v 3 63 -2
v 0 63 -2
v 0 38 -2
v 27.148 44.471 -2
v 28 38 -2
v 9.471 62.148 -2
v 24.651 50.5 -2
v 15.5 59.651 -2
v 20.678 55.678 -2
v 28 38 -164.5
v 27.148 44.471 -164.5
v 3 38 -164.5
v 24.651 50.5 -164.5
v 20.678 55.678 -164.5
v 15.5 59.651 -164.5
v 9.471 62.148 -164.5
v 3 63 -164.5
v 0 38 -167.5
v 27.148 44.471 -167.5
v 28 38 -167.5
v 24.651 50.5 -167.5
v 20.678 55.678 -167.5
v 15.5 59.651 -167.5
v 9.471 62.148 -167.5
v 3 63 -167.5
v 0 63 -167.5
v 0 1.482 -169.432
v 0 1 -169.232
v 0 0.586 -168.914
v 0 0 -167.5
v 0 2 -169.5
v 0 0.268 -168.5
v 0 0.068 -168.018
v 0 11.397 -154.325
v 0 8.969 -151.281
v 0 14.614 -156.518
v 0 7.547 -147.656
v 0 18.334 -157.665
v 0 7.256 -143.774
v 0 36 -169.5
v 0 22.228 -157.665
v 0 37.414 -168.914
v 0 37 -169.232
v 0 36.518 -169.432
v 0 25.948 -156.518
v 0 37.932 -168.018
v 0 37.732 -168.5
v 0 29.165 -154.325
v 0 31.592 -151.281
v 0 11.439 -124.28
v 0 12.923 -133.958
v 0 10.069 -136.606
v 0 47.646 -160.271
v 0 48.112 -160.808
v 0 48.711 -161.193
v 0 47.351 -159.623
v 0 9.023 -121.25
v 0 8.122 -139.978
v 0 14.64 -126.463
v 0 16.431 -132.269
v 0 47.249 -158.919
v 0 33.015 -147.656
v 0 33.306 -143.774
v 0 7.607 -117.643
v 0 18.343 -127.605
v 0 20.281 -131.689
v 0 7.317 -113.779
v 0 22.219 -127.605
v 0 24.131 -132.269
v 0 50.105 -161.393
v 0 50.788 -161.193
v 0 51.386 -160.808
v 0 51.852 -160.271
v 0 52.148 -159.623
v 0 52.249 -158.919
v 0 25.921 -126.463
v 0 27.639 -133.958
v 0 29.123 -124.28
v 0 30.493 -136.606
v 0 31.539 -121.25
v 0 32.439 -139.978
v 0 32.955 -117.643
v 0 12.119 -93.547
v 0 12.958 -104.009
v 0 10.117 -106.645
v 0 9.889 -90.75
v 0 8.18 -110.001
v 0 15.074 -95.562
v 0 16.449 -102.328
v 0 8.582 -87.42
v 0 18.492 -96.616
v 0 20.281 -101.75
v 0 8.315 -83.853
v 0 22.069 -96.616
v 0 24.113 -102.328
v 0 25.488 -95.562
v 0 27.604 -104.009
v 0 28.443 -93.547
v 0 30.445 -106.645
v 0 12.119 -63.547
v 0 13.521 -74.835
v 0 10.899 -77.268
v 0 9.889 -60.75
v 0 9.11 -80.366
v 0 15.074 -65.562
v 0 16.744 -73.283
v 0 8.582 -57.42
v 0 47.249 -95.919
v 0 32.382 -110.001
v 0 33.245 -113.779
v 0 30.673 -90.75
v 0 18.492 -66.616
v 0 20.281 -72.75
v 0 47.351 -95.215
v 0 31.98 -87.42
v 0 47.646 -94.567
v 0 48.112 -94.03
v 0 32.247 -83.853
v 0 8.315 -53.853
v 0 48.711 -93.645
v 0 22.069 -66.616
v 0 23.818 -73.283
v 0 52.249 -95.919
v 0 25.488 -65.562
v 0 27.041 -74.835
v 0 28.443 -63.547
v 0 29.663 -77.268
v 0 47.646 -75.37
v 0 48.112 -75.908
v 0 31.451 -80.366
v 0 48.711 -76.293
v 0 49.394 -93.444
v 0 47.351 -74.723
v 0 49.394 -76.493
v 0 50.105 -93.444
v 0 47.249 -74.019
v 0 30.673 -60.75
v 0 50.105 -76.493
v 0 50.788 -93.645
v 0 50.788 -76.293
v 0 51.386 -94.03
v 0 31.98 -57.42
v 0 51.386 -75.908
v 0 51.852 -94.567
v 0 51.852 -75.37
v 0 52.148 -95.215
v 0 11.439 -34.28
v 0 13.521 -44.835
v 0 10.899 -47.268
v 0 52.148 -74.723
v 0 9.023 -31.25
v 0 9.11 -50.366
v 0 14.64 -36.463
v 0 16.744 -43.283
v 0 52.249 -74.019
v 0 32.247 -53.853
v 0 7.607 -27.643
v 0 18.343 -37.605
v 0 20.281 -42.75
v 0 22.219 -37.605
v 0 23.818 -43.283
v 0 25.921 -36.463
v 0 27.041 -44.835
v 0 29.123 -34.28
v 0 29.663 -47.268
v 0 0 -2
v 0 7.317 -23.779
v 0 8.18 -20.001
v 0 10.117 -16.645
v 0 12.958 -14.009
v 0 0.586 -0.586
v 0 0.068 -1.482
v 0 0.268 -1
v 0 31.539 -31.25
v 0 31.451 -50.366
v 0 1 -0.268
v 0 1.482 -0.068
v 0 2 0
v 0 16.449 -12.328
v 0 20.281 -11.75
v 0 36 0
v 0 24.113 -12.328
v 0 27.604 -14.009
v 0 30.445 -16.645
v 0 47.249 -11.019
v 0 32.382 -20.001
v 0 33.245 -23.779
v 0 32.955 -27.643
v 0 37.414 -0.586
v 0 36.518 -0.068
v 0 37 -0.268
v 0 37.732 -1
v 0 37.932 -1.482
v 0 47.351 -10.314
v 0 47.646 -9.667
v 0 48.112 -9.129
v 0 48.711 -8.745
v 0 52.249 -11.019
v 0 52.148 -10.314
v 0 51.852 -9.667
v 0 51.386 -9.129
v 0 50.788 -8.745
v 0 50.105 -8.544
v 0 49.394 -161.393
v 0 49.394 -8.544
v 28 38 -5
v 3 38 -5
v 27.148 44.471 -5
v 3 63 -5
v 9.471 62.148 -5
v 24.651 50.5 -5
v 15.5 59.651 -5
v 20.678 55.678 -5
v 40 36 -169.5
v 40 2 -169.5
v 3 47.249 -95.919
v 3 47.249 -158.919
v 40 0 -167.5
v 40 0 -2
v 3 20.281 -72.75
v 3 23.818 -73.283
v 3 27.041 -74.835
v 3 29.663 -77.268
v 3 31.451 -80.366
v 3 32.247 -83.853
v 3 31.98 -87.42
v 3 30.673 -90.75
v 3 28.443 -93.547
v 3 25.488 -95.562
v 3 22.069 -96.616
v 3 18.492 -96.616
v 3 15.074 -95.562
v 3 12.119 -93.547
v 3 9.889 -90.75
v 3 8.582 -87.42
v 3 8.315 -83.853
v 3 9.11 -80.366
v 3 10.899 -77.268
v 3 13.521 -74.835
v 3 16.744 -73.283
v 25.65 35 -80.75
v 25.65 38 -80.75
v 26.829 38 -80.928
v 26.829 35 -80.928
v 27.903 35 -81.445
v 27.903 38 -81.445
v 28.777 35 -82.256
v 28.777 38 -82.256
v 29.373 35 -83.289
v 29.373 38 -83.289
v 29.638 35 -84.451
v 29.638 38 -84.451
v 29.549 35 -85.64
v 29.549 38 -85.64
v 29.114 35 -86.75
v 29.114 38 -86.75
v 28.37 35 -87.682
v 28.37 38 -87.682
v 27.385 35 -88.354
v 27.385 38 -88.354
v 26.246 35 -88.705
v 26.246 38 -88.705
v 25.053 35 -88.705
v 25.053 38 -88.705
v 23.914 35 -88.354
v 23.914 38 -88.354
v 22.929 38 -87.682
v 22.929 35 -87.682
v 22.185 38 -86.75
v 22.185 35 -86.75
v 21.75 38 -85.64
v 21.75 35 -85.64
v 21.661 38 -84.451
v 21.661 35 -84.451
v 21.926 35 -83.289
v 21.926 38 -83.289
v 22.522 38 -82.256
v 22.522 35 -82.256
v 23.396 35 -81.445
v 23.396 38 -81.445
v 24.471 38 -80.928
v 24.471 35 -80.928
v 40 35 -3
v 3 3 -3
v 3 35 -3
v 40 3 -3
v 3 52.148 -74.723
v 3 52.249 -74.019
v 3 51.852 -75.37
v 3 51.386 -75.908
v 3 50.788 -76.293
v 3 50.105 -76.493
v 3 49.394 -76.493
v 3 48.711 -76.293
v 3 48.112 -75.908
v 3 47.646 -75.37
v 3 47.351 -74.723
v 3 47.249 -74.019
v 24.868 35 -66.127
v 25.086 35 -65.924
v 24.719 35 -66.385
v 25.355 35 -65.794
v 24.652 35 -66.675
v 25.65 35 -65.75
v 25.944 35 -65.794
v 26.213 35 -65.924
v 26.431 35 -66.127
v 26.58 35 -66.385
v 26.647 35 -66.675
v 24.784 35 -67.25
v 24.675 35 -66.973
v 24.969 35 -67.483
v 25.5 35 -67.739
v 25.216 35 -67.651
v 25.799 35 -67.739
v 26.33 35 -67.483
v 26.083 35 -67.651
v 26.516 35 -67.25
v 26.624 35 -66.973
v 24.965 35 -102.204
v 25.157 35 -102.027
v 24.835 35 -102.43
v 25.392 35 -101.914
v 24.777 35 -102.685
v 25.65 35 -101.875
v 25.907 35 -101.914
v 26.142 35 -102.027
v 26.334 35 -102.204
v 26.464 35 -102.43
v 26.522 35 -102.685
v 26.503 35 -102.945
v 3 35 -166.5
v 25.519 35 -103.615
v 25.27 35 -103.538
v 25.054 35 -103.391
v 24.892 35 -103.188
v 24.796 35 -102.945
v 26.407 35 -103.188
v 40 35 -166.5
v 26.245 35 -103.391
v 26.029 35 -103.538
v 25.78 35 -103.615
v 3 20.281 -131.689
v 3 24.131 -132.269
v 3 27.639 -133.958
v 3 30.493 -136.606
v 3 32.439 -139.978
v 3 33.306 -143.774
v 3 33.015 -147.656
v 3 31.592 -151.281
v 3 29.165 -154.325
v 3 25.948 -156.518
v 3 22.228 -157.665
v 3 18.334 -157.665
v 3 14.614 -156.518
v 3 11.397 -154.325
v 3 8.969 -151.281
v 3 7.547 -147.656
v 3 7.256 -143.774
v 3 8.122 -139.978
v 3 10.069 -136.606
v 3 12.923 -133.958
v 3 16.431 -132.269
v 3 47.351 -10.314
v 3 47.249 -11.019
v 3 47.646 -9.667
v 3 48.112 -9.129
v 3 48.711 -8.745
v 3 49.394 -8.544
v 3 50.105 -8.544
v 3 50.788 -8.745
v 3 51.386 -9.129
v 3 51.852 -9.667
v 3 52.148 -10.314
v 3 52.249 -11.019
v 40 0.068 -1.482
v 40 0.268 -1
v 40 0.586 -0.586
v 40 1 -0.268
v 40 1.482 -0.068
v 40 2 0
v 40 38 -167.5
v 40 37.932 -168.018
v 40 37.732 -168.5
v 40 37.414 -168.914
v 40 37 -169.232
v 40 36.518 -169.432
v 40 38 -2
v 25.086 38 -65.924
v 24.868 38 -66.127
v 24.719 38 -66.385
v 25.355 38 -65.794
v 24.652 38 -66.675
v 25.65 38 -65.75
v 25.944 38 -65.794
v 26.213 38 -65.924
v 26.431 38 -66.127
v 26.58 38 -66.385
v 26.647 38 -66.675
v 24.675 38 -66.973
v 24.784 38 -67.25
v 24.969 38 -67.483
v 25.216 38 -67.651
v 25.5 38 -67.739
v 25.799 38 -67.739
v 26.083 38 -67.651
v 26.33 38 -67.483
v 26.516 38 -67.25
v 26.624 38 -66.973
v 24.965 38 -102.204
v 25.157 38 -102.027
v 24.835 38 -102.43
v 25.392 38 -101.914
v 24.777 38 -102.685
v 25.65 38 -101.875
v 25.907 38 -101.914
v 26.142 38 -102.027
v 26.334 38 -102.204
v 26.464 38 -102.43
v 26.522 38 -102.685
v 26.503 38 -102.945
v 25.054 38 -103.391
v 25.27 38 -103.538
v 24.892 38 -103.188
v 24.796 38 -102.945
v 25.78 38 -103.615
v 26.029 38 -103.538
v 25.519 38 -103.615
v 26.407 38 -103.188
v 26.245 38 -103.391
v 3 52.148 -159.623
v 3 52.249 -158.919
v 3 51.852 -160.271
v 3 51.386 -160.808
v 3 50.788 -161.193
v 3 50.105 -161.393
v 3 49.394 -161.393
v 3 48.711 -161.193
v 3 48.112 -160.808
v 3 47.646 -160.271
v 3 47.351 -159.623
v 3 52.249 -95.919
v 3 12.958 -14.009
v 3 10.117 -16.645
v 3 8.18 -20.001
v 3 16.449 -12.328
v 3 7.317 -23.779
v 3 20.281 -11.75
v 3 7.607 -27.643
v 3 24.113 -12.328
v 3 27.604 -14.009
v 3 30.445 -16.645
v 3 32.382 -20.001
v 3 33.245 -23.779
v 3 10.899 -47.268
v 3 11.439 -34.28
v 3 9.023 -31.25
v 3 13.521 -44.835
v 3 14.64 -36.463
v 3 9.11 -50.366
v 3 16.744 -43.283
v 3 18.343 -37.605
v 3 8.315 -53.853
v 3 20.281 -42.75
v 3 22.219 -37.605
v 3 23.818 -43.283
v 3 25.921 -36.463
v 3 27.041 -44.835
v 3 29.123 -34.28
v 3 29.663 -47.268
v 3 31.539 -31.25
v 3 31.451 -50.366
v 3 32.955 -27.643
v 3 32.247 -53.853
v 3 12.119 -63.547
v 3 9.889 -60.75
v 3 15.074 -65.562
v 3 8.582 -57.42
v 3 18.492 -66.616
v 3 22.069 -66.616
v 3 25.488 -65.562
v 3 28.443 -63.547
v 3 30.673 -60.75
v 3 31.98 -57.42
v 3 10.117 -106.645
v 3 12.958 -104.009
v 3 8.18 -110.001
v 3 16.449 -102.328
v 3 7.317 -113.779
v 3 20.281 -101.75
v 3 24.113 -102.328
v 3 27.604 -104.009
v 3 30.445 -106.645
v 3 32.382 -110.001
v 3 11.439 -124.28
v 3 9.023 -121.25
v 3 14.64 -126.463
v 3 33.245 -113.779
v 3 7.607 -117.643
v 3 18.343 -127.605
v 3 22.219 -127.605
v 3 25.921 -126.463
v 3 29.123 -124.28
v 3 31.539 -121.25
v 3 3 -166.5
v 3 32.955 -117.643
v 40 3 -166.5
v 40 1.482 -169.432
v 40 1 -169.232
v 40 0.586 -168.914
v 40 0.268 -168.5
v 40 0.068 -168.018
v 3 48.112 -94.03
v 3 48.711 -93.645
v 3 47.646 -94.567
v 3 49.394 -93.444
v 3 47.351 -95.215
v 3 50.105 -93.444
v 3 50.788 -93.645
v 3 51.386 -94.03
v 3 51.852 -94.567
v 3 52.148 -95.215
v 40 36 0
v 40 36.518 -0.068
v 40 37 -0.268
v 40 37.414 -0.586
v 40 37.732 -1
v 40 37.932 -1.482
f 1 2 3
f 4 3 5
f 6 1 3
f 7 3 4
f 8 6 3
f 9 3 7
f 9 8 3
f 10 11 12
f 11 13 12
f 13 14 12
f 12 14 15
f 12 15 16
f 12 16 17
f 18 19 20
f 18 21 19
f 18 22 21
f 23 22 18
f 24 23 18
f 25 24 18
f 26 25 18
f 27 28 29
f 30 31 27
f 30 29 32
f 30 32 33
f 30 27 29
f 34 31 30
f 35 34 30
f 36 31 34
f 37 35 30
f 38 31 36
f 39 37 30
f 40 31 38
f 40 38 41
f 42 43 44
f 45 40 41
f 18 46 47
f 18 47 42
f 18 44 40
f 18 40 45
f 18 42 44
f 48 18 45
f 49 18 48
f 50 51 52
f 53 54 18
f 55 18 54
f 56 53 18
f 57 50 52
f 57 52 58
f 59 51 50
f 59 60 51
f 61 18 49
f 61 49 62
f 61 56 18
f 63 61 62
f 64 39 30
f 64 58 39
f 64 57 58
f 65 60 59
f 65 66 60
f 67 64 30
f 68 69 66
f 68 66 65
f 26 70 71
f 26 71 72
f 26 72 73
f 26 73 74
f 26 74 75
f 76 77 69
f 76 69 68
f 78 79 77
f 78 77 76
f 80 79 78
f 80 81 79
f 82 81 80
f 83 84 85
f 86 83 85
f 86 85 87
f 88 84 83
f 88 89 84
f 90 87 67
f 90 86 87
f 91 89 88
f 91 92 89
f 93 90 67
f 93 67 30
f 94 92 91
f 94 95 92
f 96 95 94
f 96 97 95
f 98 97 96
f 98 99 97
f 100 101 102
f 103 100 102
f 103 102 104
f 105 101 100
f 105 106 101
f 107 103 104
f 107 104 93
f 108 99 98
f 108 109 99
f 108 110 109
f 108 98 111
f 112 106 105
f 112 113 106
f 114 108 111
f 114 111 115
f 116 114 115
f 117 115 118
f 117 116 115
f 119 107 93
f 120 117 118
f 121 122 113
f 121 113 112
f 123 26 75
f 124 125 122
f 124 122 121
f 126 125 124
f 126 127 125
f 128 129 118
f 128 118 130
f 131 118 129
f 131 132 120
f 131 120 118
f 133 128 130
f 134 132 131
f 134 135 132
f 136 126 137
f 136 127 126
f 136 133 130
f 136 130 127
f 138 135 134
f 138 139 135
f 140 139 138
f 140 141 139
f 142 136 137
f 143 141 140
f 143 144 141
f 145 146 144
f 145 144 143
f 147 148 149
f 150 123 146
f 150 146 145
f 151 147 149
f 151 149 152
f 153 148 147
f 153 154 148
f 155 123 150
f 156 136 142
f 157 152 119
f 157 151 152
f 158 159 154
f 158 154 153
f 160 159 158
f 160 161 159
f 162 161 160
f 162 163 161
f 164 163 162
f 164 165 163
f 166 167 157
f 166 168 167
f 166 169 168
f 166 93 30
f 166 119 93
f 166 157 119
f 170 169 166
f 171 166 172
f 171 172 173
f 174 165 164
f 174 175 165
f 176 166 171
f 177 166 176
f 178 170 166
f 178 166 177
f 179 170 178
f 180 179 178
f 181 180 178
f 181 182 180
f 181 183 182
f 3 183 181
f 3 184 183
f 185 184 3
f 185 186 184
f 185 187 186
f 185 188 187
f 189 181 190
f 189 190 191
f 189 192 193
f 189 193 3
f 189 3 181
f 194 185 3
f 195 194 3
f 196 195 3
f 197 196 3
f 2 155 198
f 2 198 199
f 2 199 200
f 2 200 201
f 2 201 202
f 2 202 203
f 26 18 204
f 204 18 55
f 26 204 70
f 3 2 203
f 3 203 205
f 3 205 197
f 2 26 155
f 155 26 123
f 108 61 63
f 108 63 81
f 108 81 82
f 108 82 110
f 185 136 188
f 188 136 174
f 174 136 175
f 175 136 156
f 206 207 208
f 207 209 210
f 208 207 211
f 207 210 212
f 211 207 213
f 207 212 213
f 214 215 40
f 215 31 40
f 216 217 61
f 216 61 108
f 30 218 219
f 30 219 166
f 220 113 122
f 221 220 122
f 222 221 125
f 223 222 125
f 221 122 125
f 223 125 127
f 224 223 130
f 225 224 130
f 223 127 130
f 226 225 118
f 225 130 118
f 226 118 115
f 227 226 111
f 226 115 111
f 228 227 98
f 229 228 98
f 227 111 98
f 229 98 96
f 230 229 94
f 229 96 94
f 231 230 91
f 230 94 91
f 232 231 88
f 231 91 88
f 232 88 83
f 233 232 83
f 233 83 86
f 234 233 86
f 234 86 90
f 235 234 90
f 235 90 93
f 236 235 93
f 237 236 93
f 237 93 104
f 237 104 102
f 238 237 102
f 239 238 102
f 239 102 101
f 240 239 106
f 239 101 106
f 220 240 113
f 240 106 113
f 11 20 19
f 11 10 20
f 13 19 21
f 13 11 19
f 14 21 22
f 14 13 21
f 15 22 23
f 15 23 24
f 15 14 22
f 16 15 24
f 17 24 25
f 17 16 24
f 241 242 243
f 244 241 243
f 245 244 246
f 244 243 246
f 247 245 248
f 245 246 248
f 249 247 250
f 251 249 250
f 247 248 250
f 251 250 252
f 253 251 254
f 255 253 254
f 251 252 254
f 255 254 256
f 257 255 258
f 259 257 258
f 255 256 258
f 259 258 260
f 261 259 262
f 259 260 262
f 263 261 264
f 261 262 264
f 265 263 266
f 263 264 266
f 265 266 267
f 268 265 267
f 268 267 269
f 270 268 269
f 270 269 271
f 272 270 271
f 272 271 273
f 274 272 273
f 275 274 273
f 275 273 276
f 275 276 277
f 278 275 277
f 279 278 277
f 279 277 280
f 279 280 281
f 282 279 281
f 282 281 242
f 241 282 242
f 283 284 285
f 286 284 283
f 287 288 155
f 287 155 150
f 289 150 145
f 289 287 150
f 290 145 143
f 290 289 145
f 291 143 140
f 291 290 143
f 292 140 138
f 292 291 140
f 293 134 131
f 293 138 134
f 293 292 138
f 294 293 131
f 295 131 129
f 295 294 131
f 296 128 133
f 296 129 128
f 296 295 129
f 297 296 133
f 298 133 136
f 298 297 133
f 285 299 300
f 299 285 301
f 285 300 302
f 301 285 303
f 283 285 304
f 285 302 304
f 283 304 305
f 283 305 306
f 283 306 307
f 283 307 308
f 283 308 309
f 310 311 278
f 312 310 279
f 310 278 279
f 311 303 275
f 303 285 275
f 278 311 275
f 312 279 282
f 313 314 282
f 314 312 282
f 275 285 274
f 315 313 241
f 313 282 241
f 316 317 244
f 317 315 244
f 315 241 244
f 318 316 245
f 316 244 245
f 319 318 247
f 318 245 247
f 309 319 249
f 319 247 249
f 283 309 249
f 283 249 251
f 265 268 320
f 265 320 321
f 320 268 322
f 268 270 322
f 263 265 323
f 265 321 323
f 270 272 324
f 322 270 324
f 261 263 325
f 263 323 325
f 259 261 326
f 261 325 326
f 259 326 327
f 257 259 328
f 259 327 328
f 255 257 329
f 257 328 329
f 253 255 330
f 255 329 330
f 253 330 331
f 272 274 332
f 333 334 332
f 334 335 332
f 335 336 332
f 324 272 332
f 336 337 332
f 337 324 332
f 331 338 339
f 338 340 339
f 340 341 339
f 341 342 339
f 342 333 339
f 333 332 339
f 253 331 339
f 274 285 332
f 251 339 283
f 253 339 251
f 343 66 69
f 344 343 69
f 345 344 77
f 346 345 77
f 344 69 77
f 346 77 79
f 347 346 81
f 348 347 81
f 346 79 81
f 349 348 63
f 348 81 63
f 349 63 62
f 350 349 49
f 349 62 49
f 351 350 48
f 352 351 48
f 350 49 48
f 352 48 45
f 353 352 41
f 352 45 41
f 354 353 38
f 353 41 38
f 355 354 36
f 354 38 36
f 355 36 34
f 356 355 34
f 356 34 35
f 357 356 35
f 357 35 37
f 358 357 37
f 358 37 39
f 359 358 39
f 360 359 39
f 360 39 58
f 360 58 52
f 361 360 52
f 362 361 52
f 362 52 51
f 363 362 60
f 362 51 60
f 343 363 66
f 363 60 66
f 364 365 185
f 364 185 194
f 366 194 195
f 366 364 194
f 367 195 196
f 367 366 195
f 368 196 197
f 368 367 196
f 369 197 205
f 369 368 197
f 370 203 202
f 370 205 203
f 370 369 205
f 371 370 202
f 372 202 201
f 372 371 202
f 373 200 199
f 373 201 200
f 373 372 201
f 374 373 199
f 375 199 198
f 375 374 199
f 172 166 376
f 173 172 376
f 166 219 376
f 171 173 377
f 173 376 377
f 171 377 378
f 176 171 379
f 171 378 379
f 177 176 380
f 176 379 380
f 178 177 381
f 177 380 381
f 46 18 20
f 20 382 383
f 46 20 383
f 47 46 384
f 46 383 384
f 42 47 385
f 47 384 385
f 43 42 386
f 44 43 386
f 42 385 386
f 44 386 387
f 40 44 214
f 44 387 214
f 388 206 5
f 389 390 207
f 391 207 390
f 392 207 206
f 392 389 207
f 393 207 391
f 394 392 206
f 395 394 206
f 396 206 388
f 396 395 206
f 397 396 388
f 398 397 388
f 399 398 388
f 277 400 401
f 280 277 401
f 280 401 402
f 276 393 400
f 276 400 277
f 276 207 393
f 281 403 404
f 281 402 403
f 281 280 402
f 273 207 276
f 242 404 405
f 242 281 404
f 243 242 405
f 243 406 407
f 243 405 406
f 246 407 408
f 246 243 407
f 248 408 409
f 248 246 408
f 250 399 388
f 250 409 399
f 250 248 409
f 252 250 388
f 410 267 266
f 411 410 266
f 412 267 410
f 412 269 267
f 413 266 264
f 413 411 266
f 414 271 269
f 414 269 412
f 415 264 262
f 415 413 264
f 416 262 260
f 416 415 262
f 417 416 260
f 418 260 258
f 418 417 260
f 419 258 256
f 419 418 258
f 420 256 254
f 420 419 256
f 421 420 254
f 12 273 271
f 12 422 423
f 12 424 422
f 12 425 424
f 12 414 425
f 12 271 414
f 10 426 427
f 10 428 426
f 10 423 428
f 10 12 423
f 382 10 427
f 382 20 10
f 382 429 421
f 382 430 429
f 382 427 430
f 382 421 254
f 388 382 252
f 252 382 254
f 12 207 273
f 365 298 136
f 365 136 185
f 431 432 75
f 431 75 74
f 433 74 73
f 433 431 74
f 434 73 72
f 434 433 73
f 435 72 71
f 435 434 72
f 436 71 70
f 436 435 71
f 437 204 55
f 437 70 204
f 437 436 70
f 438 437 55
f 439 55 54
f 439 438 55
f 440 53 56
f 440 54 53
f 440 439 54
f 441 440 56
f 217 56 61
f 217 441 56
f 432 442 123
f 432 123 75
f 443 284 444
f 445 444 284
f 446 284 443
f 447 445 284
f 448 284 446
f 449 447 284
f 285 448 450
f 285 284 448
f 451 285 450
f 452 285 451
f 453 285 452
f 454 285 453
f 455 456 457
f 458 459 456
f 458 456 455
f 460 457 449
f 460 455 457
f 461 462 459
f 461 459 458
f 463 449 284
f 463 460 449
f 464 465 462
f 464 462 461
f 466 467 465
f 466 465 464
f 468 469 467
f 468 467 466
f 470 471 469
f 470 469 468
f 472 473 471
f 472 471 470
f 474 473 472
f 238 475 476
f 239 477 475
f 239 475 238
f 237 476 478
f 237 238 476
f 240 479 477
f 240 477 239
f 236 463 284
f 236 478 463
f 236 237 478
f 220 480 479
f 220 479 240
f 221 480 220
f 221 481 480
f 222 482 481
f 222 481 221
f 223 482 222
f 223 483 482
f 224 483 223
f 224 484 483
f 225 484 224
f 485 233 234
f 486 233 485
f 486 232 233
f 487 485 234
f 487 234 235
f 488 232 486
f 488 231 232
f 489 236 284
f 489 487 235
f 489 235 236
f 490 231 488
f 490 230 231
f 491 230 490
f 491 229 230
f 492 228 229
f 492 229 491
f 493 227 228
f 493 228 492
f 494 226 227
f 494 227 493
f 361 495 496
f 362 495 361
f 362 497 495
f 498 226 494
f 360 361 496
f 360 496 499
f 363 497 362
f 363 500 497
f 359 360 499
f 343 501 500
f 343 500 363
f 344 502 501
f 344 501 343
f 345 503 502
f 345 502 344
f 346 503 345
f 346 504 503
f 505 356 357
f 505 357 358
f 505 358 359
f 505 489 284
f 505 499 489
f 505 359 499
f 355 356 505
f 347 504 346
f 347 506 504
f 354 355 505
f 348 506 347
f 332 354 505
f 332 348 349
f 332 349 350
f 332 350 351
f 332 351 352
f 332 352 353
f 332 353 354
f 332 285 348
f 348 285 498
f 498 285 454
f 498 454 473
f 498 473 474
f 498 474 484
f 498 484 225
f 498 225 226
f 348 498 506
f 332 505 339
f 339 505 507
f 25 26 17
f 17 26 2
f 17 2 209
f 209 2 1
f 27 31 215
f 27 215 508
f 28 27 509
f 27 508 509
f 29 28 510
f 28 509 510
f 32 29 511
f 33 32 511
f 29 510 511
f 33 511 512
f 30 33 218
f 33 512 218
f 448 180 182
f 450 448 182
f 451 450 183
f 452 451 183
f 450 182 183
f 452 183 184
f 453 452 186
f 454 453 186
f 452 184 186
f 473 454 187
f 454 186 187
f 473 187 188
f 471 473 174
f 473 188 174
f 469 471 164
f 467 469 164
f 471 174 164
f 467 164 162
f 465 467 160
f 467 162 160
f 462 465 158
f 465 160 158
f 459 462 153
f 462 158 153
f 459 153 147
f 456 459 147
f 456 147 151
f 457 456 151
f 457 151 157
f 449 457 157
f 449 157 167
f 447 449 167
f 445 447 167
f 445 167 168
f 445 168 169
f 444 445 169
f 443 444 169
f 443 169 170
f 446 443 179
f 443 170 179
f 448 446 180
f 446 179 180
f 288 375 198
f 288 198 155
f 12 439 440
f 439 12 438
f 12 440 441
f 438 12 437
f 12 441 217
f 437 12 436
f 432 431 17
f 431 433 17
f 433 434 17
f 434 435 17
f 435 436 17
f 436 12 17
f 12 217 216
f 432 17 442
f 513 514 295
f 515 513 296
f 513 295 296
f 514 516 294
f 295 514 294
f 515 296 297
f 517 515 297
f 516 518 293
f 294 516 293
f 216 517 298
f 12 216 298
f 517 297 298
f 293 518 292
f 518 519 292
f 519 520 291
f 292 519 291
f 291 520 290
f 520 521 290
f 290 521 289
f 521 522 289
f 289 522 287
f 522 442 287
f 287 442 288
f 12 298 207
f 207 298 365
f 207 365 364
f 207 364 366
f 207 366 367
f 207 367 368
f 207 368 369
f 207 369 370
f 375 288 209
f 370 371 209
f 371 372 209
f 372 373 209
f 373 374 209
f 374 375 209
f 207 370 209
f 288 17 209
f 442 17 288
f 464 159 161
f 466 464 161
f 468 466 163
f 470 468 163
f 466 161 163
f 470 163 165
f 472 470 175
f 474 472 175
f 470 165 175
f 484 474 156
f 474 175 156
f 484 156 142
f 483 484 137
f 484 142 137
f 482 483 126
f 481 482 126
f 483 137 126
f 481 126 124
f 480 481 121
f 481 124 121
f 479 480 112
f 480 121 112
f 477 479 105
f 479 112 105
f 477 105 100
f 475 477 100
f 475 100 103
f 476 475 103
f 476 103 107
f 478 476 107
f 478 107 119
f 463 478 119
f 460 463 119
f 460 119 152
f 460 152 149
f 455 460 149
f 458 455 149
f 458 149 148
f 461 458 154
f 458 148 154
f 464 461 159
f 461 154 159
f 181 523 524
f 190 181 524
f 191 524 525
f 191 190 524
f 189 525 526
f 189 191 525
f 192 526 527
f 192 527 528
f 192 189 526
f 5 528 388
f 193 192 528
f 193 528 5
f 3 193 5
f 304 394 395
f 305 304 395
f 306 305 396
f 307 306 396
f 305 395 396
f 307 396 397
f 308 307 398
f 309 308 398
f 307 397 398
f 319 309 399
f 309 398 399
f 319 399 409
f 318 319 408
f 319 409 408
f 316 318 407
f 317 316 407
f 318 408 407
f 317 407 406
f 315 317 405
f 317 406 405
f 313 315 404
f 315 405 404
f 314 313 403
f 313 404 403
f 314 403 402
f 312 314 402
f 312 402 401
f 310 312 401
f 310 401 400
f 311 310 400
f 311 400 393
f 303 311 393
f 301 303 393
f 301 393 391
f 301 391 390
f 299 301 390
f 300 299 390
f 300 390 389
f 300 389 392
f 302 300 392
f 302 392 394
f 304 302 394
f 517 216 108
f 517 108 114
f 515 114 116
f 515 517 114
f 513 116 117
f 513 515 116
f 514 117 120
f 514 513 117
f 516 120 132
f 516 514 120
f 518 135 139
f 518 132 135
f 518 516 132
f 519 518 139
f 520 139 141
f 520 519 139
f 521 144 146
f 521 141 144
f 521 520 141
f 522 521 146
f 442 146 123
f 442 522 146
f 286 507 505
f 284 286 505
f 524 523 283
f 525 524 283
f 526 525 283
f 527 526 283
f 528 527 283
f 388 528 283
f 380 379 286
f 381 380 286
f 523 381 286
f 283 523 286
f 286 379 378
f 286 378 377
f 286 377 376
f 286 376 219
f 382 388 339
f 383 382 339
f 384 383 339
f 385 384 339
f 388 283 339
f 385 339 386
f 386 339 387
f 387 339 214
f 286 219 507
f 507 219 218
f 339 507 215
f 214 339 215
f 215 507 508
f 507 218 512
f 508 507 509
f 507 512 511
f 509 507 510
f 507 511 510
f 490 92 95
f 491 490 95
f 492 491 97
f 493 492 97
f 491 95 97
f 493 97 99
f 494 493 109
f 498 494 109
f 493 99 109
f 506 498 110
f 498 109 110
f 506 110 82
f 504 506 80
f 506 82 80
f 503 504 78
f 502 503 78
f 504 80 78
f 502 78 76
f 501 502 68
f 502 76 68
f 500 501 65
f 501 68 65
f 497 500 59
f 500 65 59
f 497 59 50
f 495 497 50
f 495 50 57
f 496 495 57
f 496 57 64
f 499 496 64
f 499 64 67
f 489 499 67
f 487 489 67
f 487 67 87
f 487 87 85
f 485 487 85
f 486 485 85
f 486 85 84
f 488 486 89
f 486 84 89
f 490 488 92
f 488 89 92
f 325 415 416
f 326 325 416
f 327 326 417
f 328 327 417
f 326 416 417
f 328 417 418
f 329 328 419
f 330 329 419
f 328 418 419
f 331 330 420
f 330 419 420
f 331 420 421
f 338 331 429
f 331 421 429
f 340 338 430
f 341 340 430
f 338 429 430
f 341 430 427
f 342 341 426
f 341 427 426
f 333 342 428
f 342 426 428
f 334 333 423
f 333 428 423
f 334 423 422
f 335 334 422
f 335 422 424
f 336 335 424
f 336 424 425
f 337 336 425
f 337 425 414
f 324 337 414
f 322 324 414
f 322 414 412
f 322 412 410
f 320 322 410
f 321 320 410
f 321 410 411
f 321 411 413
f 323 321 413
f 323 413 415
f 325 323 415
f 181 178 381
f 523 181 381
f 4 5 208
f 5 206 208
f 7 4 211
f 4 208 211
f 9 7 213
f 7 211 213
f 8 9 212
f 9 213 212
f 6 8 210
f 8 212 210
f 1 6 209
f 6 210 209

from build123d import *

# Parameters (mm, degrees)
SKETCH1_W            = 169.5
SKETCH1_H            = 38
BOSS_EXTRUDE1_DEPTH  = 3
SKETCH12_W           = 40
SKETCH12_H           = 3
BOSS_EXTRUDE3_DEPTH  = 38
SKETCH16_W           = 37
SKETCH16_H           = 3
BOSS_EXTRUDE4_DEPTH  = 38
SKETCH18_W           = 37
SKETCH18_H           = 163.5
BOSS_EXTRUDE5_DEPTH  = 3
FILLET1_R            = 2
FILLET2_R            = 2
FILLET3_R            = 2
FILLET4_R            = 2
SKETCH37_W           = 165.5
SKETCH37_H           = 25
BOSS_EXTRUDE12_DEPTH = 3
SKETCH40_W           = 25
SKETCH40_H           = 25
BOSS_EXTRUDE13_DEPTH = 3
FILLET11_R           = 25
SKETCH41_W           = 25
SKETCH41_H           = 25
BOSS_EXTRUDE14_DEPTH = 3
FILLET12_R           = 25
CUT_EXTRUDE19_DEPTH  = 10
SKETCH62_R           = 4
CUT_EXTRUDE23_DEPTH  = 10
SKETCH66_R           = 0.875
CUT_EXTRUDE24_DEPTH  = 10
SKETCH63_R           = 1
CUT_EXTRUDE26_DEPTH  = 10
SKETCH19_W           = 37
SKETCH19_H           = 163.5
BOSS_EXTRUDE16_DEPTH = 3
SKETCH123_R          = 13.061371159
CUT_EXTRUDE30_DEPTH  = 3
SKETCH125_R          = 13
CUT_EXTRUDE31_DEPTH  = 3
SKETCH126_R          = 13
CUT_EXTRUDE32_DEPTH  = 3
SKETCH67_R           = 12
CUT_EXTRUDE33_DEPTH  = 3
SKETCH118_R          = 12
CUT_EXTRUDE34_DEPTH  = 3


with BuildPart() as part:
    # Sketch1 → Boss-Extrude1 (new body)
    with BuildSketch(Plane(origin=(0, 0, 0), x_dir=(0, 0, -1), z_dir=(1, 0, 0))):
        with Locations((84.75, 19)):
            Rectangle(SKETCH1_W, SKETCH1_H)
    extrude(amount=BOSS_EXTRUDE1_DEPTH)

    # Sketch12 → Boss-Extrude3 (add)
    with BuildSketch(Plane(origin=(0, 0, -169.5), x_dir=(1, 0, 0), z_dir=(0, 1, 0))):
        with Locations((20, -1.5)):
            Rectangle(SKETCH12_W, SKETCH12_H)
    extrude(amount=BOSS_EXTRUDE3_DEPTH)

    # Sketch16 → Boss-Extrude4 (add)
    with BuildSketch(Plane(origin=(3, 0, 0), x_dir=(1, 0, 0), z_dir=(0, 1, 0))):
        with Locations((18.5, 1.5)):
            Rectangle(SKETCH16_W, SKETCH16_H)
    extrude(amount=BOSS_EXTRUDE4_DEPTH)

    # Sketch18 → Boss-Extrude5 (add)
    with BuildSketch(Plane(origin=(0, 38, 0), x_dir=(1, 0, 0), z_dir=(0, 1, 0))):
        with Locations((21.5, 84.75)):
            Rectangle(SKETCH18_W, SKETCH18_H)
    extrude(amount=-BOSS_EXTRUDE5_DEPTH)

    # Fillet1
    fillet1_edges = [part.edges().sort_by_distance(p)[0] for p in [
        (20, 0, 0),
    ]]
    fillet(fillet1_edges, radius=FILLET1_R)

    # Fillet2
    fillet2_edges = [part.edges().sort_by_distance(p)[0] for p in [
        (20, 38, 0),
    ]]
    fillet(fillet2_edges, radius=FILLET2_R)

    # Fillet3
    fillet3_edges = [part.edges().sort_by_distance(p)[0] for p in [
        (20, 38, -169.5),
    ]]
    fillet(fillet3_edges, radius=FILLET3_R)

    # Fillet4
    fillet4_edges = [part.edges().sort_by_distance(p)[0] for p in [
        (20, 0, -169.5),
    ]]
    fillet(fillet4_edges, radius=FILLET4_R)

    # Sketch37 → Boss-Extrude12 (add)
    with BuildSketch(Plane.ZY):
        with Locations((-84.75, 50.5)):
            Rectangle(SKETCH37_W, SKETCH37_H)
    extrude(amount=-BOSS_EXTRUDE12_DEPTH)

    # Sketch40 → Boss-Extrude13 (add)
    with BuildSketch(Plane(origin=(0, 0, -167.5), x_dir=(-1, 0, 0), z_dir=(0, 0, -1))):
        with Locations((-15.5, 50.5)):
            Rectangle(SKETCH40_W, SKETCH40_H)
    extrude(amount=-BOSS_EXTRUDE13_DEPTH)

    # Fillet11
    fillet11_edges = [part.edges().sort_by_distance(p)[0] for p in [
        (28, 63, -166),
    ]]
    fillet(fillet11_edges, radius=FILLET11_R - 0.0001)  # a hair under: the kernel refuses the full size

    # Sketch41 → Boss-Extrude14 (add)
    with BuildSketch(Plane.XY.offset(-2)):
        with Locations((15.5, 50.5)):
            Rectangle(SKETCH41_W, SKETCH41_H)
    extrude(amount=-BOSS_EXTRUDE14_DEPTH)

    # Fillet12
    fillet12_edges = [part.edges().sort_by_distance(p)[0] for p in [
        (28, 63, -3.5),
    ]]
    fillet(fillet12_edges, radius=FILLET12_R - 0.0001)  # a hair under: the kernel refuses the full size

    # Sketch57 → Cut-Extrude19 (cut)
    with BuildSketch(Plane(origin=(3, 0, 0), x_dir=(0, 0, -1), z_dir=(1, 0, 0))):
        with BuildLine():
            Line((11.018645082, 52.249341523), (74.018645082, 52.249341523))
            ThreePointArc((74.018645082, 52.249341523), (76.518645082, 49.749341523), (74.018645082, 47.249341523))
            Line((74.018645082, 47.249341523), (11.018645082, 47.249341523))
            ThreePointArc((11.018645082, 47.249341523), (8.518645082, 49.749341523), (11.018645082, 52.249341523))
        make_face()
        with BuildLine():
            Line((158.918944647, 47.24934152), (95.918944647, 47.24934152))
            ThreePointArc((95.918944647, 47.24934152), (93.418944647, 49.74934152), (95.918944647, 52.24934152))
            Line((95.918944647, 52.24934152), (158.918944647, 52.24934152))
            ThreePointArc((158.918944647, 52.24934152), (161.418944647, 49.74934152), (158.918944647, 47.24934152))
        make_face()
    extrude(amount=-CUT_EXTRUDE19_DEPTH, mode=Mode.SUBTRACT)

    # Sketch62 → Cut-Extrude23 (cut)
    with BuildSketch(Plane(origin=(0, 38, 0), x_dir=(1, 0, 0), z_dir=(0, 1, 0))):
        with Locations(Location((25.649526178, 84.75, 0), (0, 0, 270))):
            Circle(SKETCH62_R)
    extrude(amount=-CUT_EXTRUDE23_DEPTH, mode=Mode.SUBTRACT)

    # Sketch66 → Cut-Extrude24 (cut)
    with BuildSketch(Plane(origin=(0, 38, 0), x_dir=(1, 0, 0), z_dir=(0, 1, 0))):
        with Locations(Location((25.649526178, 102.75, 0), (0, 0, 270))):
            Circle(SKETCH66_R)
    extrude(amount=-CUT_EXTRUDE24_DEPTH, mode=Mode.SUBTRACT)

    # Sketch63 → Cut-Extrude26 (cut)
    with BuildSketch(Plane(origin=(0, 38, 0), x_dir=(1, 0, 0), z_dir=(0, 1, 0))):
        with Locations(Location((25.649526178, 66.75, 0), (0, 0, 270))):
            Circle(SKETCH63_R)
    extrude(amount=-CUT_EXTRUDE26_DEPTH, mode=Mode.SUBTRACT)

    # Sketch19 → Boss-Extrude16 (add)
    with BuildSketch(Plane(origin=(0, 0, 0), x_dir=(-1, 0, 0), z_dir=(0, -1, 0))):
        with Locations((-21.5, 84.75)):
            Rectangle(SKETCH19_W, SKETCH19_H)
    extrude(amount=-BOSS_EXTRUDE16_DEPTH)

    # Sketch123 → Cut-Extrude30 (cut)
    with BuildSketch(Plane.ZY):
        with Locations((-144.75, 20.2809694)):
            Circle(SKETCH123_R)
    extrude(amount=-CUT_EXTRUDE30_DEPTH, mode=Mode.SUBTRACT)

    # Sketch125 → Cut-Extrude31 (cut)
    with BuildSketch(Plane.ZY):
        with Locations((-24.75, 20.2809694)):
            Circle(SKETCH125_R)
    extrude(amount=-CUT_EXTRUDE31_DEPTH, mode=Mode.SUBTRACT)

    # Sketch126 → Cut-Extrude32 (cut)
    with BuildSketch(Plane.ZY):
        with Locations((-114.75, 20.2809694)):
            Circle(SKETCH126_R)
    extrude(amount=-CUT_EXTRUDE32_DEPTH, mode=Mode.SUBTRACT)

    # Sketch67 → Cut-Extrude33 (cut)
    with BuildSketch(Plane.ZY):
        with Locations((-84.75, 20.2809694)):
            Circle(SKETCH67_R)
    extrude(amount=-CUT_EXTRUDE33_DEPTH, mode=Mode.SUBTRACT)

    # Sketch118 → Cut-Extrude34 (cut)
    with BuildSketch(Plane.ZY):
        with Locations((-54.75, 20.2809694)):
            Circle(SKETCH118_R)
    extrude(amount=-CUT_EXTRUDE34_DEPTH, mode=Mode.SUBTRACT)


solid = part.part
